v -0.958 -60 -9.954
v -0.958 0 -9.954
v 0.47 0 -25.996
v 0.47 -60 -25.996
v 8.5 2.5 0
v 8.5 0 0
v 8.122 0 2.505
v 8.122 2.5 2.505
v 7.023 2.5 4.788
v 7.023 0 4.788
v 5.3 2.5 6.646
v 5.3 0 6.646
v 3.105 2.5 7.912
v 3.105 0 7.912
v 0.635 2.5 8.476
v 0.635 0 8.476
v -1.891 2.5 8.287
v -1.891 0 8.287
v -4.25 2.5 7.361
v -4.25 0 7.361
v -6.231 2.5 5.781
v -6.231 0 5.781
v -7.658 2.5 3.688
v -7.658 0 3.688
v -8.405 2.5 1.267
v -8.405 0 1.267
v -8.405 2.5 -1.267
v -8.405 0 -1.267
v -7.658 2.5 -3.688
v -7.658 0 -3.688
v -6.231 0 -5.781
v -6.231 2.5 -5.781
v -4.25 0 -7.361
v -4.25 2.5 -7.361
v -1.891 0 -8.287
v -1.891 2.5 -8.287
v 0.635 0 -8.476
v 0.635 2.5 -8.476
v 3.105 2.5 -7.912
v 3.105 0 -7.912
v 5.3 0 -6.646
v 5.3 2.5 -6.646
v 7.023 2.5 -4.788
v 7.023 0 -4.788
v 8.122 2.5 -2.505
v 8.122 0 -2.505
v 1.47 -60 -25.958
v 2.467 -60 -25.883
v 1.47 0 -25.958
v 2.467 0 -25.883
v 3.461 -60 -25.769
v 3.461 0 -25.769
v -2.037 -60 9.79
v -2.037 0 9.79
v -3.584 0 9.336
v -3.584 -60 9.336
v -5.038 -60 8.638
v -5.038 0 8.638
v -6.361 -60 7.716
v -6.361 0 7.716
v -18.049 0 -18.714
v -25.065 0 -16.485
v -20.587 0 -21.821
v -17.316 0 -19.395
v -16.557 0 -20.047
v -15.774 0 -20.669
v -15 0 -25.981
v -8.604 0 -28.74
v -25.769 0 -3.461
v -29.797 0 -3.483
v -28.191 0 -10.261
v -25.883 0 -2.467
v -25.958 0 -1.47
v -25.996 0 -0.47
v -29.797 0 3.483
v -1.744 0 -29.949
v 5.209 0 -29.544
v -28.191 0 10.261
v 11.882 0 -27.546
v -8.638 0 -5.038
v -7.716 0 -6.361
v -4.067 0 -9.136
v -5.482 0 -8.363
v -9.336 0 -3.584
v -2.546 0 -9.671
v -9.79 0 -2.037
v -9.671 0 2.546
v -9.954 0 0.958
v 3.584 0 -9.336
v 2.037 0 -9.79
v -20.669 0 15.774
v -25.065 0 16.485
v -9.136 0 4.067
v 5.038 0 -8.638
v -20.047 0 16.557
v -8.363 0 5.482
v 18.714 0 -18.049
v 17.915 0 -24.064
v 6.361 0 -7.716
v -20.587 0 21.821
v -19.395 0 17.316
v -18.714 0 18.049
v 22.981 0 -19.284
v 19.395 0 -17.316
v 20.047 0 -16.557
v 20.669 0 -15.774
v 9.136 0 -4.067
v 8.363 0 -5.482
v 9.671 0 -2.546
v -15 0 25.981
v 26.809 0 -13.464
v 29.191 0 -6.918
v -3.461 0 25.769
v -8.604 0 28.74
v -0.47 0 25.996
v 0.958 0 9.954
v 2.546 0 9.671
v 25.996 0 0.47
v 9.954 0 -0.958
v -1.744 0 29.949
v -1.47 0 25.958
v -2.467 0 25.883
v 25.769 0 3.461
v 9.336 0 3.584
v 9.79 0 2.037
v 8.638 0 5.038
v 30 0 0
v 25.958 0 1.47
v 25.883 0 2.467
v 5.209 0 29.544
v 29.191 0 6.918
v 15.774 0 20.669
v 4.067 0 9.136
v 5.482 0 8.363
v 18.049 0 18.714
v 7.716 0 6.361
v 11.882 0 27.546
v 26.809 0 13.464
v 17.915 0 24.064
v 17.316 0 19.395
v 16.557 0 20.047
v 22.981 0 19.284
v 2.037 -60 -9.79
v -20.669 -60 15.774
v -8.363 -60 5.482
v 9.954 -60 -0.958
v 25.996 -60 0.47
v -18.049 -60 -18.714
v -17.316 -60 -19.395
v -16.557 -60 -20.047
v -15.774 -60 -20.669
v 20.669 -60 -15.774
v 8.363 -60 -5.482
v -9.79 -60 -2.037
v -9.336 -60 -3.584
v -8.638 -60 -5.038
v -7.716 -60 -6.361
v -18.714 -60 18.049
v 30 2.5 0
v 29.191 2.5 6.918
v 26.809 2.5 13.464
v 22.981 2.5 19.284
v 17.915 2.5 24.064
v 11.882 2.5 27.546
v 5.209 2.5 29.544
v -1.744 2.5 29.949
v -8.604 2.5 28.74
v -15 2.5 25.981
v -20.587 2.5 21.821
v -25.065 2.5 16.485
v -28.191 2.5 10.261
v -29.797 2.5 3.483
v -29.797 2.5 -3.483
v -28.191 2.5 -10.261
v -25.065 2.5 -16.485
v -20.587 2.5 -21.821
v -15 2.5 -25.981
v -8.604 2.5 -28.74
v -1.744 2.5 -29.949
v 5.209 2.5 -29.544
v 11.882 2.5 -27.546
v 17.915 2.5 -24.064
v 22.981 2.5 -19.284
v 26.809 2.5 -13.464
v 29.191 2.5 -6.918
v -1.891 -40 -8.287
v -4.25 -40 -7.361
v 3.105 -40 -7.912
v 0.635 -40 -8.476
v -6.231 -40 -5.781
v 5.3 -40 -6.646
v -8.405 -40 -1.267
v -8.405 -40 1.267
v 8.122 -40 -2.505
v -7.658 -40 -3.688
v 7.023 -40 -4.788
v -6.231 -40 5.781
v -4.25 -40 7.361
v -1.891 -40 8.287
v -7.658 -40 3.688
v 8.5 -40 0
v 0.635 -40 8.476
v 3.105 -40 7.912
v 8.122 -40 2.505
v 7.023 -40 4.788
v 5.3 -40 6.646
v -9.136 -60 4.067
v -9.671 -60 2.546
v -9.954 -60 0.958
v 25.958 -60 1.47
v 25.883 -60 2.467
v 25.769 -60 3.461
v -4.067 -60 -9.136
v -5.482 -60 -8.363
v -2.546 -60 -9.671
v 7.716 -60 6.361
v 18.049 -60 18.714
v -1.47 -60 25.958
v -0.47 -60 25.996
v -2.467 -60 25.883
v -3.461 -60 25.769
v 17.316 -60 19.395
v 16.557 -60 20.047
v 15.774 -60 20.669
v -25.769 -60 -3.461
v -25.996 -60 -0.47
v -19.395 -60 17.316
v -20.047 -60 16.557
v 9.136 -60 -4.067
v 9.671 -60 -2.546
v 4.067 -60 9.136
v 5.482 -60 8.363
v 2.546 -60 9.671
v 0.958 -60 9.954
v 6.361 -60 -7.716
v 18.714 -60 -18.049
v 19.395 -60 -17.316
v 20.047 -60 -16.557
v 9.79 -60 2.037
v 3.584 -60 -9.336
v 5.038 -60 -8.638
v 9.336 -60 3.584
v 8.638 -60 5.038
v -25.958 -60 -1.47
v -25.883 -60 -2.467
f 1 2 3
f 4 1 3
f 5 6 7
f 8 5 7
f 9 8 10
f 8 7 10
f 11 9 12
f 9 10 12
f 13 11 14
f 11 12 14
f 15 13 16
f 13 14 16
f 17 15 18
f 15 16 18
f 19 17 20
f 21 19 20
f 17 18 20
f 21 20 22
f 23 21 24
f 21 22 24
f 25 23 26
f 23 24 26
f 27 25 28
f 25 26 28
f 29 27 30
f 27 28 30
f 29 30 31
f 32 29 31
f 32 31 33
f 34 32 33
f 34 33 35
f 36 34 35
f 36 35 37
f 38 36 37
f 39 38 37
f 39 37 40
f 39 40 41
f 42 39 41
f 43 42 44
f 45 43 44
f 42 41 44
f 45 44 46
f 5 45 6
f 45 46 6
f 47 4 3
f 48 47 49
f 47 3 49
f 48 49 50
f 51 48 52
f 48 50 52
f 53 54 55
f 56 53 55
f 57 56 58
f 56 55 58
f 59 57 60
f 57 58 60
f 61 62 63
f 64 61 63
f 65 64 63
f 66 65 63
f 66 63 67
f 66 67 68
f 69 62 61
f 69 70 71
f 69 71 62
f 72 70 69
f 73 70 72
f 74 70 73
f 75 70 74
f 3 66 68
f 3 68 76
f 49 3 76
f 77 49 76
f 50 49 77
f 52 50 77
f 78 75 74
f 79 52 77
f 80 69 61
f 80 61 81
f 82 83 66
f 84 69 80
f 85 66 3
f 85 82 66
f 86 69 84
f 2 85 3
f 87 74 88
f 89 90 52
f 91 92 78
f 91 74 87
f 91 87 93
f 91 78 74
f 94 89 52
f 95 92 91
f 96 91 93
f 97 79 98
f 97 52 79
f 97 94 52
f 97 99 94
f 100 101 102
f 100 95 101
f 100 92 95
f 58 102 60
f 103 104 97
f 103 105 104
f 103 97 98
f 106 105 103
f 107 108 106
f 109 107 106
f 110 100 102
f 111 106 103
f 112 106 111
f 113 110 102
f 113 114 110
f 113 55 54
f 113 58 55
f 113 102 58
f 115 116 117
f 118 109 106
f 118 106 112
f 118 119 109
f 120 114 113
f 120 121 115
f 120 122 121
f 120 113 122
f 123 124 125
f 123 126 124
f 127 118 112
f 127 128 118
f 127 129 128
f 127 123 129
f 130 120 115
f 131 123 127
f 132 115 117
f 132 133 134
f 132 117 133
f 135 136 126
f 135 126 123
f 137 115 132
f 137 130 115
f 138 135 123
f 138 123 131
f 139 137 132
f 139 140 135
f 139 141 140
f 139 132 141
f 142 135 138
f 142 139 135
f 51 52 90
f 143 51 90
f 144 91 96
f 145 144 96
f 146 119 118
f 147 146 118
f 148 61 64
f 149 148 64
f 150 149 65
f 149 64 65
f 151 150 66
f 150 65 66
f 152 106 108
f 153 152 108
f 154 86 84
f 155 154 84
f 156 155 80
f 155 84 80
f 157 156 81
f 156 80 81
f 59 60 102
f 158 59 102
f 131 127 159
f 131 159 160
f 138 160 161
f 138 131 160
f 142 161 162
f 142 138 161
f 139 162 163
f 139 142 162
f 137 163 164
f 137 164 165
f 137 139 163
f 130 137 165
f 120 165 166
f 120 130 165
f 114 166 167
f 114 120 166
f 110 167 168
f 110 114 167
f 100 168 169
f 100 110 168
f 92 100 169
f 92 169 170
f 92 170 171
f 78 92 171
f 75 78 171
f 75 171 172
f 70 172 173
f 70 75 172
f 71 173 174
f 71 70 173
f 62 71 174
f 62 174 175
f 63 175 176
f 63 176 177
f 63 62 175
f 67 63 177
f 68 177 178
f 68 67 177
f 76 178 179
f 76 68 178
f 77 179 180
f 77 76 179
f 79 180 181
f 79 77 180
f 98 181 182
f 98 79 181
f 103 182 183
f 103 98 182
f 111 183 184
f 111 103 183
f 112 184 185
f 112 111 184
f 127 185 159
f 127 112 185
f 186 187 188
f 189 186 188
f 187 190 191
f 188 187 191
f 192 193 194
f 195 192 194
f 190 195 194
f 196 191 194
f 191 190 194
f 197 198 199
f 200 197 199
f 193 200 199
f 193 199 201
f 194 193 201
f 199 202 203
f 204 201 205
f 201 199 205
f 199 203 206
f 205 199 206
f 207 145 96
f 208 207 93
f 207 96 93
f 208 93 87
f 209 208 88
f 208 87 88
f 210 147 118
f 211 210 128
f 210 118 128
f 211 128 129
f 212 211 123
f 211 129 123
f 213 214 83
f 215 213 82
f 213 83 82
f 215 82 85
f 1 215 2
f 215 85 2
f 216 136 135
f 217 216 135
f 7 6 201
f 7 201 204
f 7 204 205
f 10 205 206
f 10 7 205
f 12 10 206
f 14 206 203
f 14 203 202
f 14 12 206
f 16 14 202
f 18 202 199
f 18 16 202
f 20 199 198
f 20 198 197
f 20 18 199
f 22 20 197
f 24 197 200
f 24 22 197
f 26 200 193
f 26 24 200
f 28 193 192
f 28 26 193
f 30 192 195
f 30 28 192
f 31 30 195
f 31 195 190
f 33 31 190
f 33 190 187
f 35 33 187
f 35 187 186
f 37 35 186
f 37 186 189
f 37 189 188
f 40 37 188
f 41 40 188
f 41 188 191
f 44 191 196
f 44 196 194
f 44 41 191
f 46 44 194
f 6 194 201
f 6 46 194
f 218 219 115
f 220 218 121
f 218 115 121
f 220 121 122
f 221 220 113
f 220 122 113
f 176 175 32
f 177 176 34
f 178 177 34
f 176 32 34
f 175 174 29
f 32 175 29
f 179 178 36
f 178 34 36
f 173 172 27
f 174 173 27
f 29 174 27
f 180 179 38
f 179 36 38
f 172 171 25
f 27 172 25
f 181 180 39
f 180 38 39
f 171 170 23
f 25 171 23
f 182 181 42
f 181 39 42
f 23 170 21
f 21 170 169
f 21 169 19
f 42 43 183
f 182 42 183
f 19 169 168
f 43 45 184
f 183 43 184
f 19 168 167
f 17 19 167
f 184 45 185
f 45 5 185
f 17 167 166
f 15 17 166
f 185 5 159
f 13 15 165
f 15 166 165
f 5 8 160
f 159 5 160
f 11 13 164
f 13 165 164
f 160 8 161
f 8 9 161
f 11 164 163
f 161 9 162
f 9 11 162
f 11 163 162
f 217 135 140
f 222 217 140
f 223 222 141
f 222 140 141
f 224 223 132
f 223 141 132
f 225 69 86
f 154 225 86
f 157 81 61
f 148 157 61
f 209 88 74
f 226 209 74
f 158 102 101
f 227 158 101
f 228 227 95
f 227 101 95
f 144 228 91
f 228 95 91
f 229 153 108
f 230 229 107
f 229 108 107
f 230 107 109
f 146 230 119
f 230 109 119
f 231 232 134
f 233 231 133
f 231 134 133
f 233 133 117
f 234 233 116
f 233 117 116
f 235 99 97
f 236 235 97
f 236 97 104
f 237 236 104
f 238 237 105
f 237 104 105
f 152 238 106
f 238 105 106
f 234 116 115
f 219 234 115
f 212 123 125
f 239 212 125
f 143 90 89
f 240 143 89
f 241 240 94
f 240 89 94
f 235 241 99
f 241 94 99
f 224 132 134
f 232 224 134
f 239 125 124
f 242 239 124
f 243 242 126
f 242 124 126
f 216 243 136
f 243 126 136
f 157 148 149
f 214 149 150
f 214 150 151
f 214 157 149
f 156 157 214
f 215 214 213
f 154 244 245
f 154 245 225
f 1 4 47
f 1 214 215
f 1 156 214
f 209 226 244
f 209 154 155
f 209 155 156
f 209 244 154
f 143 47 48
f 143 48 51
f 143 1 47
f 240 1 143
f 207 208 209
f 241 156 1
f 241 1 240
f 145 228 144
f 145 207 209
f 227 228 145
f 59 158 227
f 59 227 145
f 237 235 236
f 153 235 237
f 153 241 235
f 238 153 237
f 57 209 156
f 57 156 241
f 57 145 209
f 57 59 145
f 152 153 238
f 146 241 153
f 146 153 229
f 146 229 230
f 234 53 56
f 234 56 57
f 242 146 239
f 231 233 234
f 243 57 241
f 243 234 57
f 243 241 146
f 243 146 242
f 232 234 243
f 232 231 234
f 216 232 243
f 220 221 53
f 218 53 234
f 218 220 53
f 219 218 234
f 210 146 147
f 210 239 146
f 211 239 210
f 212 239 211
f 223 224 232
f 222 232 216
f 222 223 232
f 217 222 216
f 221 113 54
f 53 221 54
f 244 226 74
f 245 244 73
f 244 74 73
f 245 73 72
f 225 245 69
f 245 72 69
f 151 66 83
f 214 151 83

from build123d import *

# Parameters (mm, degrees)
F0_R     = 30
F0_R_2   = 8.5
F1_DEPTH = 2.5
F3_DEPTH = 60
F4_DEPTH = 40


with BuildPart() as f1:
    # F0 (on Front) → F1 (new body)
    with BuildSketch(Plane.XZ):
        Circle(F0_R)
        Circle(F0_R_2, mode=Mode.SUBTRACT)
    extrude(amount=-F1_DEPTH)

    # F2 (on Front) → F3 (join)
    with BuildSketch(Plane.XZ):
        with BuildLine():
            ThreePointArc((9.9539621754, -0.9584555339), (9.9884839128, -0.4797802861), (10, 0))
            ThreePointArc((10, 0), (9.9474412154, 1.0239205366), (9.790317347, 2.0370778693))
            ThreePointArc((9.790317347, 2.0370778693), (9.0162927853, 4.3250970404), (7.7162445614, 6.3607837464))
            ThreePointArc((7.7162445614, 6.3607837464), (6.6748253827, 7.4462545021), (5.4823682108, 8.3632313612))
            ThreePointArc((5.4823682108, 8.3632313612), (3.3171763231, 9.4337872163), (0.9584555339, 9.9539621754))
            ThreePointArc((0.9584555339, 9.9539621754), (-0.5454827615, 9.9851113442), (-2.0370778693, 9.790317347))
            ThreePointArc((-2.0370778693, 9.790317347), (-4.3250970404, 9.0162927853), (-6.3607837464, 7.7162445614))
            ThreePointArc((-6.3607837464, 7.7162445614), (-7.4462545021, 6.6748253827), (-8.3632313612, 5.4823682108))
            ThreePointArc((-8.3632313612, 5.4823682108), (-9.4337872163, 3.3171763231), (-9.9539621754, 0.9584555339))
            ThreePointArc((-9.9539621754, 0.9584555339), (-9.9851113442, -0.5454827615), (-9.790317347, -2.0370778693))
            ThreePointArc((-9.790317347, -2.0370778693), (-9.0162927853, -4.3250970404), (-7.7162445614, -6.3607837464))
            ThreePointArc((-7.7162445614, -6.3607837464), (-6.6748253827, -7.4462545021), (-5.4823682108, -8.3632313612))
            ThreePointArc((-5.4823682108, -8.3632313612), (-3.3171763231, -9.4337872163), (-0.9584555339, -9.9539621754))
            ThreePointArc((-0.9584555339, -9.9539621754), (0.5454827615, -9.9851113442), (2.0370778693, -9.790317347))
            ThreePointArc((2.0370778693, -9.790317347), (4.3250970404, -9.0162927853), (6.3607837464, -7.7162445614))
            ThreePointArc((6.3607837464, -7.7162445614), (7.4462545021, -6.6748253827), (8.3632313612, -5.4823682108))
            ThreePointArc((8.3632313612, -5.4823682108), (9.4337872163, -3.3171763231), (9.9539621754, -0.9584555339))
        make_face()
        with BuildLine():
            ThreePointArc((-8.3632313612, 5.4823682108), (-7.4462545021, 6.6748253827), (-6.3607837464, 7.7162445614))
            Line((-6.3607837464, 7.7162445614), (-18.7140811189, 18.0494644761))
            ThreePointArc((-18.7140811189, 18.0494644761), (-19.7242264231, 16.9397429736), (-20.6686668466, 15.7735921965))
            Line((-20.6686668466, 15.7735921965), (-8.3632313612, 5.4823682108))
        make_face()
        with BuildLine():
            Line((-15.7735921965, -20.6686668466), (-5.4823682108, -8.3632313612))
            ThreePointArc((-5.4823682108, -8.3632313612), (-6.6748253827, -7.4462545021), (-7.7162445614, -6.3607837464))
            Line((-7.7162445614, -6.3607837464), (-18.0494644761, -18.7140811189))
            ThreePointArc((-18.0494644761, -18.7140811189), (-16.9397429736, -19.7242264231), (-15.7735921965, -20.6686668466))
        make_face()
        with BuildLine():
            Line((3.4613404795, -25.7685684912), (2.0370778693, -9.790317347))
            ThreePointArc((2.0370778693, -9.790317347), (0.5454827615, -9.9851113442), (-0.9584555339, -9.9539621754))
            Line((-0.9584555339, -9.9539621754), (0.469954935, -25.9957523907))
            ThreePointArc((0.469954935, -25.9957523907), (1.9689271292, -25.9253413856), (3.4613404795, -25.7685684912))
        make_face()
        with BuildLine():
            Line((20.6686668466, -15.7735921965), (8.3632313612, -5.4823682108))
            ThreePointArc((8.3632313612, -5.4823682108), (7.4462545021, -6.6748253827), (6.3607837464, -7.7162445614))
            Line((6.3607837464, -7.7162445614), (18.7140811189, -18.0494644761))
            ThreePointArc((18.7140811189, -18.0494644761), (19.7242264231, -16.9397429736), (20.6686668466, -15.7735921965))
        make_face()
        with BuildLine():
            ThreePointArc((9.790317347, 2.0370778693), (9.9474412154, 1.0239205366), (10, 0))
            ThreePointArc((10, 0), (9.9884839128, -0.4797802861), (9.9539621754, -0.9584555339))
            Line((9.9539621754, -0.9584555339), (25.9957523907, 0.469954935))
            ThreePointArc((25.9957523907, 0.469954935), (25.9253413856, 1.9689271292), (25.7685684912, 3.4613404795))
            Line((25.7685684912, 3.4613404795), (9.790317347, 2.0370778693))
        make_face()
        with BuildLine():
            ThreePointArc((5.4823682108, 8.3632313612), (6.6748253827, 7.4462545021), (7.7162445614, 6.3607837464))
            Line((7.7162445614, 6.3607837464), (18.0494644761, 18.7140811189))
            ThreePointArc((18.0494644761, 18.7140811189), (16.9397429736, 19.7242264231), (15.7735921965, 20.6686668466))
            Line((15.7735921965, 20.6686668466), (5.4823682108, 8.3632313612))
        make_face()
        with BuildLine():
            ThreePointArc((-2.0370778693, 9.790317347), (-0.5454827615, 9.9851113442), (0.9584555339, 9.9539621754))
            Line((0.9584555339, 9.9539621754), (-0.469954935, 25.9957523907))
            ThreePointArc((-0.469954935, 25.9957523907), (-1.9689271292, 25.9253413856), (-3.4613404795, 25.7685684912))
            Line((-3.4613404795, 25.7685684912), (-2.0370778693, 9.790317347))
        make_face()
        with BuildLine():
            ThreePointArc((-9.790317347, -2.0370778693), (-9.9851113442, -0.5454827615), (-9.9539621754, 0.9584555339))
            Line((-9.9539621754, 0.9584555339), (-25.9957523907, -0.469954935))
            ThreePointArc((-25.9957523907, -0.469954935), (-25.9253413856, -1.9689271292), (-25.7685684912, -3.4613404795))
            Line((-25.7685684912, -3.4613404795), (-9.790317347, -2.0370778693))
        make_face()
    extrude(amount=F3_DEPTH)

    # F4 (cut): a face of the model
    f4_faces = [f1.faces().sort_by_distance(p)[0] for p in [
        (0, 0, 0),
    ]]
    extrude(f4_faces, amount=-F4_DEPTH, mode=Mode.SUBTRACT)


solid = f1.part
